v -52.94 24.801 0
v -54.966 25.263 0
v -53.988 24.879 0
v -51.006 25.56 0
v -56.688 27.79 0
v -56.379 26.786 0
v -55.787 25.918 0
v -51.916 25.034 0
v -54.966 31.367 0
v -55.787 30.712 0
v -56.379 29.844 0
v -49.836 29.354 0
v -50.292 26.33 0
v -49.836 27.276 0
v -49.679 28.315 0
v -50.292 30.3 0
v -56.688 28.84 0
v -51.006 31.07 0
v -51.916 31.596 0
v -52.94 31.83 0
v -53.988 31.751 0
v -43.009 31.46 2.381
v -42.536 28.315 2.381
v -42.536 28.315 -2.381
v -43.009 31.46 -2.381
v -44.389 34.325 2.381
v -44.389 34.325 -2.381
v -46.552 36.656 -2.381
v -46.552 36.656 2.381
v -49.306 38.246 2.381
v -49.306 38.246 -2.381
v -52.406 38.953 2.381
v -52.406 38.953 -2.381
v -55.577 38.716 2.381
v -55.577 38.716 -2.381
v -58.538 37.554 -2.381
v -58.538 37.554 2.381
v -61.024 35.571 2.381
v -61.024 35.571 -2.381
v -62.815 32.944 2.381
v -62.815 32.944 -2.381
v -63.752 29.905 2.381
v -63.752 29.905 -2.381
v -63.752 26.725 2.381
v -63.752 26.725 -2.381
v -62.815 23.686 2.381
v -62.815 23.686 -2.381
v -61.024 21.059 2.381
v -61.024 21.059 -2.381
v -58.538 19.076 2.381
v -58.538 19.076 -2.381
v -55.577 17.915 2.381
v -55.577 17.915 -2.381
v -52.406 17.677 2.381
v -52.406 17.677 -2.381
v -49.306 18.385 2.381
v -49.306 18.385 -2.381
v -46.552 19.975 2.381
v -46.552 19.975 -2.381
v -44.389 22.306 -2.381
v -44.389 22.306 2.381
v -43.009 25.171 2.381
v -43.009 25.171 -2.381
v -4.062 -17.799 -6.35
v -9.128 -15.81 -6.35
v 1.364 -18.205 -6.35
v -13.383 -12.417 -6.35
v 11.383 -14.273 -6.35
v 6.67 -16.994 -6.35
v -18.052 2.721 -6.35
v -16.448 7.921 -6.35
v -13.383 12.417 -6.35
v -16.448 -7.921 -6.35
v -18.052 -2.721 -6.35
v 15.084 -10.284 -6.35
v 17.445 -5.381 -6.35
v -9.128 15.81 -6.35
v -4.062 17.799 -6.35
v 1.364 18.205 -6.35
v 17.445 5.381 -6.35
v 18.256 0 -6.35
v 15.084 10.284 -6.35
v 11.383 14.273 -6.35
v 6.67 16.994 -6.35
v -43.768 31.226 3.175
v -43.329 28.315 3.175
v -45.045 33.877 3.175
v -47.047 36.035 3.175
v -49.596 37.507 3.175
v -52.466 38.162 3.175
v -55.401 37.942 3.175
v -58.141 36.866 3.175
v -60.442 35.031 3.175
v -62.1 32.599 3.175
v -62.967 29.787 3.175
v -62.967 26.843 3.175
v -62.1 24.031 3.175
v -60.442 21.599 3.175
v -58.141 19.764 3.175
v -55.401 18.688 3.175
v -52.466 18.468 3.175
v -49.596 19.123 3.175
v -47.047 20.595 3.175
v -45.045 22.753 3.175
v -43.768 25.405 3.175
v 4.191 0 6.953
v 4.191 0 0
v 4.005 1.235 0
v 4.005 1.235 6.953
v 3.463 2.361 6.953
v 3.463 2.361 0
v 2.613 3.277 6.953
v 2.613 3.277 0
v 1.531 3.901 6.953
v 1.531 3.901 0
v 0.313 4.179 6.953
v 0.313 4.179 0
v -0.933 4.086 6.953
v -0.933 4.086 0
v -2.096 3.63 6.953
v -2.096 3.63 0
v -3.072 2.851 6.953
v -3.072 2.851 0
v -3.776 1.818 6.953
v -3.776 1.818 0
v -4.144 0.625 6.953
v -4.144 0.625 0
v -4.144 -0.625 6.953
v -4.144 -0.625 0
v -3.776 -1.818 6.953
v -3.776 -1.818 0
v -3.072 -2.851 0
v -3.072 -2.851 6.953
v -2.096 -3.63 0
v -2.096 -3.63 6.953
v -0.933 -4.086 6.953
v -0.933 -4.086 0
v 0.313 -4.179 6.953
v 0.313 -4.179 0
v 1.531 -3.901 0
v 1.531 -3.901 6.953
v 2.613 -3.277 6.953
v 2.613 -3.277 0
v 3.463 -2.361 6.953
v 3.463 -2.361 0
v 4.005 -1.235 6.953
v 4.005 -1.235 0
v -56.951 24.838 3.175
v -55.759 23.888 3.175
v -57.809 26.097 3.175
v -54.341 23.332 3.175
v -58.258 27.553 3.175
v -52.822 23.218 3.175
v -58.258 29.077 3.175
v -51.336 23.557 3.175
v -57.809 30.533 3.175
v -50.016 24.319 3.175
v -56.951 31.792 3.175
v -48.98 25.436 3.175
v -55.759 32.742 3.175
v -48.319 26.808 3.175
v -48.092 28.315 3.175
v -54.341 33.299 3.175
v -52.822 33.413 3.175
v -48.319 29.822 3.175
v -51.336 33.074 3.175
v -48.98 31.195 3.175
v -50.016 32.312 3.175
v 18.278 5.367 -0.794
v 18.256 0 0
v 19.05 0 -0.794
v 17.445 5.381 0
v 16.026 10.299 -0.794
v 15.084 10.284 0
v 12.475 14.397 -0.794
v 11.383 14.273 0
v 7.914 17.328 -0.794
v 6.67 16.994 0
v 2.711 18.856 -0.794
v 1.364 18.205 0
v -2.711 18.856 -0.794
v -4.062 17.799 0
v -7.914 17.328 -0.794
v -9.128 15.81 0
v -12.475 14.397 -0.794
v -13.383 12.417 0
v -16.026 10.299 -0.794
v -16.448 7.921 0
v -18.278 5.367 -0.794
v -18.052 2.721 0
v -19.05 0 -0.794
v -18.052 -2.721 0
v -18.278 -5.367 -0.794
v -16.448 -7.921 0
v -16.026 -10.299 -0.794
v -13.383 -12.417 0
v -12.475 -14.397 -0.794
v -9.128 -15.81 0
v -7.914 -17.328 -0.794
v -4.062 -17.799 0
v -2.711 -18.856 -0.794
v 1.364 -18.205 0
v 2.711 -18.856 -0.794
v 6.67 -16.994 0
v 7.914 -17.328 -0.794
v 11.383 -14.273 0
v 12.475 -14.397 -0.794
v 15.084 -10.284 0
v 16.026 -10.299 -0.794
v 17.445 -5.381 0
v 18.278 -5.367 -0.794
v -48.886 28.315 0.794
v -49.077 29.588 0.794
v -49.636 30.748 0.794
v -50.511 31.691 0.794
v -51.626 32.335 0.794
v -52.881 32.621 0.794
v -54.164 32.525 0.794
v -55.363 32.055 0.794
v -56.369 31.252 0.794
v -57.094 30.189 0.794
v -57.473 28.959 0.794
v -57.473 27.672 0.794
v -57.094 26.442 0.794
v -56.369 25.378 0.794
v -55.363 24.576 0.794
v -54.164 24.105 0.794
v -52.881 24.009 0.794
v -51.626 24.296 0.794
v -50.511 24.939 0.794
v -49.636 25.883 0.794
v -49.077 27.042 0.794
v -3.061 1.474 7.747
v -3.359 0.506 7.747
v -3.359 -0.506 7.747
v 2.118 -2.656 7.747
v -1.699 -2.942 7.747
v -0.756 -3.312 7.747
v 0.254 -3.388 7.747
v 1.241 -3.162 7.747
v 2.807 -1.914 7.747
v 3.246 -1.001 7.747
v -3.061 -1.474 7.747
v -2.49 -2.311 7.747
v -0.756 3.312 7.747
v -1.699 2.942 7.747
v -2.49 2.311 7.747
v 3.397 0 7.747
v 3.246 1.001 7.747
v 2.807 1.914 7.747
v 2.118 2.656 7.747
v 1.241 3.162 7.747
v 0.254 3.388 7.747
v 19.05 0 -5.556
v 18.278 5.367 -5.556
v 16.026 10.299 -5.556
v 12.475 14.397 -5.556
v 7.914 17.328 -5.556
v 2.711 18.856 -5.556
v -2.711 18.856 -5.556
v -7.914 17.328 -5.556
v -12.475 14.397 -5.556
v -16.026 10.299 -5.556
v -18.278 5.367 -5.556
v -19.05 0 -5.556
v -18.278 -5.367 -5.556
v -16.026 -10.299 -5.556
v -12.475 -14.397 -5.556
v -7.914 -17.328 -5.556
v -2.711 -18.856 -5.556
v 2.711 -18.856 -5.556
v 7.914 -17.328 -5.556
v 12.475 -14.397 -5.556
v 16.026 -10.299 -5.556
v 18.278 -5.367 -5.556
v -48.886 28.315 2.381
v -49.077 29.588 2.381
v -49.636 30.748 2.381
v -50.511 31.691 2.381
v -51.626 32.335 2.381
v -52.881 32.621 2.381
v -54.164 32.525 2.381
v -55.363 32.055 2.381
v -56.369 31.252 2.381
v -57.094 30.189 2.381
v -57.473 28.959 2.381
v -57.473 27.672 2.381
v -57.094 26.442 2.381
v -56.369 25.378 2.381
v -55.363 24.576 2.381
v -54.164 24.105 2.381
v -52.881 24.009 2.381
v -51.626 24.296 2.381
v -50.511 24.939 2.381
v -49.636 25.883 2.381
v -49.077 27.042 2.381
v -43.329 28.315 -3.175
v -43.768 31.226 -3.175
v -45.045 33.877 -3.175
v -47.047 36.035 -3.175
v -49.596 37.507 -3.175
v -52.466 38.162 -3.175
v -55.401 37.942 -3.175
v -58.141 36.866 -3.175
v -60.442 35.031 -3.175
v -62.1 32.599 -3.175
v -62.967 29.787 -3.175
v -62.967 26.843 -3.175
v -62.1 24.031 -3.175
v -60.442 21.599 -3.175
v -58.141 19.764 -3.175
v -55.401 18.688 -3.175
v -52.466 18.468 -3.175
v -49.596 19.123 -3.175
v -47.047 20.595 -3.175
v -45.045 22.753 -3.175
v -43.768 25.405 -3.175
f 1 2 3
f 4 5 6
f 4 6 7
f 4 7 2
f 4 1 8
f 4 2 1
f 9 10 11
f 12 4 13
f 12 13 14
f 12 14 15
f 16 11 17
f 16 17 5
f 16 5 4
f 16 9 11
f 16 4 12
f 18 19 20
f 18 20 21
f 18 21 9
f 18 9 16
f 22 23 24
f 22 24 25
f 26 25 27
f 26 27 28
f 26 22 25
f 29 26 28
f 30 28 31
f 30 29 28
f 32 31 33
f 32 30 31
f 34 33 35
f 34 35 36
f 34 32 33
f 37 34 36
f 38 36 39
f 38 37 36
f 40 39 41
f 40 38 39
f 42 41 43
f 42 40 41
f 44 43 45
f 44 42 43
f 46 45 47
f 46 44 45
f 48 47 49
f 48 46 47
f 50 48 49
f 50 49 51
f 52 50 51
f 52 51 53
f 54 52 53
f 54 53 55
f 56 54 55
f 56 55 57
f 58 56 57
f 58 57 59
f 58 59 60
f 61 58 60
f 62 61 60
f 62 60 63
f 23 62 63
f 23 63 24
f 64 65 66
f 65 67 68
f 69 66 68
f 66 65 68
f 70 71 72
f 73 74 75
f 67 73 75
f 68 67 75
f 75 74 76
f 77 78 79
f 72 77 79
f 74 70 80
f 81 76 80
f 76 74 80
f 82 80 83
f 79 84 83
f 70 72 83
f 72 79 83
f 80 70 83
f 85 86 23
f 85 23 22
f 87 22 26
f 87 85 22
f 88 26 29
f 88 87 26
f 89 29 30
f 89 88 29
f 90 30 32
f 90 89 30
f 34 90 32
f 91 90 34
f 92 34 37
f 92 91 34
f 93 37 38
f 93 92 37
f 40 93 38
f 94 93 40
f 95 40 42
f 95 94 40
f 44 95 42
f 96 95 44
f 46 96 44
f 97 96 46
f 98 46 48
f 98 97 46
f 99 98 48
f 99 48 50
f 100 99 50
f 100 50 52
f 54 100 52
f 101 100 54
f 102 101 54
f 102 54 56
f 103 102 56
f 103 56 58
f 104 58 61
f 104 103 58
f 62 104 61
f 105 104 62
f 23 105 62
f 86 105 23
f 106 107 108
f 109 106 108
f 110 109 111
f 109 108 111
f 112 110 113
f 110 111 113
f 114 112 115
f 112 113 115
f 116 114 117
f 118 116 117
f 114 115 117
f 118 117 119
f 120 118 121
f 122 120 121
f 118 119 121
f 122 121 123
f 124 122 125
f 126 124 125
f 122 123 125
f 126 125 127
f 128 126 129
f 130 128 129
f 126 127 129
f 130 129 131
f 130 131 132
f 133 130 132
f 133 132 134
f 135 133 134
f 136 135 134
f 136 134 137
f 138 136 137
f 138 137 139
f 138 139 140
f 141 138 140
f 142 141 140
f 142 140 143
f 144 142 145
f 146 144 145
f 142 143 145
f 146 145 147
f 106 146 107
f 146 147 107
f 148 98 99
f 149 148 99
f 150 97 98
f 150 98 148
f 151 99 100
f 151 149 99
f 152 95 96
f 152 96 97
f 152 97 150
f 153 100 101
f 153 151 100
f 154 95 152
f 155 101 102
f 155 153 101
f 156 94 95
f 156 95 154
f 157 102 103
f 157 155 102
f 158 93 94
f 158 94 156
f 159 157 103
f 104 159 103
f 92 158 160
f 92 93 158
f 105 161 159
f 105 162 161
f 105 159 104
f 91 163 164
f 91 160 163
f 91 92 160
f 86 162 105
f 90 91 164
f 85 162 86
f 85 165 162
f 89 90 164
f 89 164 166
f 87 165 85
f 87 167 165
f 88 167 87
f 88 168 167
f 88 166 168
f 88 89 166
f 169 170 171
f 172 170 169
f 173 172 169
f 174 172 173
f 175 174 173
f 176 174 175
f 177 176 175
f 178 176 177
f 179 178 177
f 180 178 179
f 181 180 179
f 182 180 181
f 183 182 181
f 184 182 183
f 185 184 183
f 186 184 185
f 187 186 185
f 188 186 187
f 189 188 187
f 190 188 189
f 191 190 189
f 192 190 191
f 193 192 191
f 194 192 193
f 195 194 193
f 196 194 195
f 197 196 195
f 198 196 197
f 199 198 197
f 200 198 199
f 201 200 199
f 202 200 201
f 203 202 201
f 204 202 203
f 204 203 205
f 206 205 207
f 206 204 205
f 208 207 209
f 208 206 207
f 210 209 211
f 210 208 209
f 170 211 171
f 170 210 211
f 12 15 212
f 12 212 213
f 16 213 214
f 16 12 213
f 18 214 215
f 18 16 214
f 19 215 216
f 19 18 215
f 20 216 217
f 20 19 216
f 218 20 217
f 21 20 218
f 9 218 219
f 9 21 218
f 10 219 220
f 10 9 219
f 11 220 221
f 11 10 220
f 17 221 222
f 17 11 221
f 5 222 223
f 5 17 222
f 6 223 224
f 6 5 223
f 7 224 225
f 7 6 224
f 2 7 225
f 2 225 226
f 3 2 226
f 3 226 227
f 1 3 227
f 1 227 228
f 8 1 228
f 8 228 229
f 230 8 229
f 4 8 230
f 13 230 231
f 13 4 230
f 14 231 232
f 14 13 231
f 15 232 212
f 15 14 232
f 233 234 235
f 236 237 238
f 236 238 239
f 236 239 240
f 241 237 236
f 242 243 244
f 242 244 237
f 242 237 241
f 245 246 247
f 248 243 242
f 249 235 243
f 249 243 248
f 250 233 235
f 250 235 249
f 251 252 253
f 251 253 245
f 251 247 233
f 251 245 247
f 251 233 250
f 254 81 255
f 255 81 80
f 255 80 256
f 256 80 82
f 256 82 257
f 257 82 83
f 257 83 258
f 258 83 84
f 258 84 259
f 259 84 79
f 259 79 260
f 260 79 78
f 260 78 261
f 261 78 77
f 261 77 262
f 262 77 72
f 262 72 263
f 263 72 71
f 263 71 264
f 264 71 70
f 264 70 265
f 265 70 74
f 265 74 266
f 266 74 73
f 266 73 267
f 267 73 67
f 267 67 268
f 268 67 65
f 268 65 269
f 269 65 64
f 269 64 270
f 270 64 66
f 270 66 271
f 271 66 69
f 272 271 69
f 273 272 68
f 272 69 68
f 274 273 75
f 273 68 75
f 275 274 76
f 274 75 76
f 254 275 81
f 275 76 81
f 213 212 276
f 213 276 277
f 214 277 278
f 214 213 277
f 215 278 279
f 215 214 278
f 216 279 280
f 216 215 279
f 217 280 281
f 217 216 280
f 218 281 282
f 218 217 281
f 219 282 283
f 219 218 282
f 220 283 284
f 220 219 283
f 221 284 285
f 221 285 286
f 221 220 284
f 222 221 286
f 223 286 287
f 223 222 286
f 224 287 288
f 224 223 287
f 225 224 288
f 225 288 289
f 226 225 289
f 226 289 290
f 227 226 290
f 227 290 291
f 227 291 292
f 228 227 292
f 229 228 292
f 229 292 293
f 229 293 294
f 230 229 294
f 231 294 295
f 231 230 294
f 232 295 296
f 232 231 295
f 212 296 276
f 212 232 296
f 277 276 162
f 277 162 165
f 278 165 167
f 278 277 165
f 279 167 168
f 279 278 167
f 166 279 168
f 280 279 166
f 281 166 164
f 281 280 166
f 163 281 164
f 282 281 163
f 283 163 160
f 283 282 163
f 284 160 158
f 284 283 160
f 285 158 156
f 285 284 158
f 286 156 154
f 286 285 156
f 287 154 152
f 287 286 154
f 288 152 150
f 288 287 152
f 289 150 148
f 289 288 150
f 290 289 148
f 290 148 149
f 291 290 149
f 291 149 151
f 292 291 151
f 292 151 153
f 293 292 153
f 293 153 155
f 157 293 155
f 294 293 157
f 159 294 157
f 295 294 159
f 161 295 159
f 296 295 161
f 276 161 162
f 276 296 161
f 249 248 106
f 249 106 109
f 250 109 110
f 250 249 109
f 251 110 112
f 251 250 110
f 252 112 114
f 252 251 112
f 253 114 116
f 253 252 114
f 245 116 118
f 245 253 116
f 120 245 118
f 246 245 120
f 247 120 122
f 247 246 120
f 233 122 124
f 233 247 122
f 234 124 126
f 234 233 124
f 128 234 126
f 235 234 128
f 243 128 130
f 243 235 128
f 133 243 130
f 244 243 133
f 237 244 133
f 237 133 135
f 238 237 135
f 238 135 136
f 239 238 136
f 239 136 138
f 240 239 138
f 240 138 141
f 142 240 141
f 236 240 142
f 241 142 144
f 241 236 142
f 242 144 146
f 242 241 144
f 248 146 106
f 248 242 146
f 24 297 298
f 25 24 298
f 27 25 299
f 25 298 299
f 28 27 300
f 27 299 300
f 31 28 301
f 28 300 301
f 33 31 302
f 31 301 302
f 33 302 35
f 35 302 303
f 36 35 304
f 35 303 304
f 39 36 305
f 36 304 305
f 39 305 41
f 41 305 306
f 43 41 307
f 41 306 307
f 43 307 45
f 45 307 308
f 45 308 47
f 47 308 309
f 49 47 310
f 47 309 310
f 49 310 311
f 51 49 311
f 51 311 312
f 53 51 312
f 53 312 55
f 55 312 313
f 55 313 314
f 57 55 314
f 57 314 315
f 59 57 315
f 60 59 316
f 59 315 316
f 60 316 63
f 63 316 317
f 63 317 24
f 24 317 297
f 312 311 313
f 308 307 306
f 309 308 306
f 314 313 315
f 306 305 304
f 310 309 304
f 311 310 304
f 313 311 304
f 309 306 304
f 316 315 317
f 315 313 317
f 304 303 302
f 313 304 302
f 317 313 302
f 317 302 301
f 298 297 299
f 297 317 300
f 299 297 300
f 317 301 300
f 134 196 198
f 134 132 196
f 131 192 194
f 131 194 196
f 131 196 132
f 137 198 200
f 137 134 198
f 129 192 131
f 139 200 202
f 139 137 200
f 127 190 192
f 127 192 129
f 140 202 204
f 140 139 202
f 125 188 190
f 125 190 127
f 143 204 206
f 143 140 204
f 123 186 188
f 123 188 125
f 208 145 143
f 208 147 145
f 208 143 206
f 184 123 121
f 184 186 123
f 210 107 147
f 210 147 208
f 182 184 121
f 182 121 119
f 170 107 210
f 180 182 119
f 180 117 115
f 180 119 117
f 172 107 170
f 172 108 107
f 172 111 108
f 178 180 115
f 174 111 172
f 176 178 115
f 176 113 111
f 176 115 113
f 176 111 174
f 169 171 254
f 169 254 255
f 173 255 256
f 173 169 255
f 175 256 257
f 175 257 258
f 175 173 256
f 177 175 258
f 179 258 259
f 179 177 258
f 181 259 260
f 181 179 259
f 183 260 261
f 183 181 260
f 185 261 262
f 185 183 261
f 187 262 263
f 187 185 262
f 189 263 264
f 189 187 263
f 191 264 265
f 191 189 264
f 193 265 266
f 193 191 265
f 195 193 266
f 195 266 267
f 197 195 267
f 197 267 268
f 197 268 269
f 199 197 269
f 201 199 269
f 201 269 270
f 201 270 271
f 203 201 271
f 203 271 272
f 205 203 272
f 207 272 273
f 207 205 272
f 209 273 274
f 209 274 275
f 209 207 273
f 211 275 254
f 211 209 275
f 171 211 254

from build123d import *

# Parameters (mm, degrees)
F0_R      = 4.191
F1_DEPTH  = 7.747
F0_R_2    = 19.05
F2_DEPTH  = 6.35
F0_R_3    = 10.668
F0_R_4    = 4.318
F3_DEPTH  = 3.175
F4_DEPTH  = 3.175
F5_SIZE   = 0.79375
F5_2_SIZE = 0.79375


with BuildPart() as f1:
    # F0 (on Top) → F1 (new body)
    with BuildSketch(Plane.XY):
        Circle(F0_R)
    extrude(amount=F1_DEPTH)

    # F0 (on Top) → F2 (join)
    with BuildSketch(Plane.XY):
        Circle(F0_R_2)
        Circle(F0_R, mode=Mode.SUBTRACT)
        Circle(F0_R)
    extrude(amount=-F2_DEPTH)

    # F5#2
    f5_2_edges = [f1.edges().sort_by_distance(p)[0] for p in [
        (19.05, 0, -3.175),
        (-19.05, 0, 0),
        (-19.05, 0, -6.35),
        (-4.191, 0, 7.747),
    ]]
    chamfer(f5_2_edges, length=F5_2_SIZE)


with BuildPart() as f3:
    # F0 (on Top) → F3 (new body)
    with BuildSketch(Plane.XY):
        with Locations((-53.2035343349, 28.3151138574)):
            Circle(F0_R_3)
        with Locations((-53.2035343349, 28.3151138574)):
            Circle(F0_R_4, mode=Mode.SUBTRACT)
    extrude(amount=F3_DEPTH)

    # F0 (on Top) → F4 (join)
    with BuildSketch(Plane.XY):
        with Locations((-53.2035343349, 28.3151138574)):
            Circle(F0_R_3)
        with Locations((-53.2035343349, 28.3151138574)):
            Circle(F0_R_4, mode=Mode.SUBTRACT)
        with Locations((-53.2035343349, 28.3151138574)):
            Circle(F0_R_4)
    extrude(amount=-F4_DEPTH)

    # F5
    f5_edges = [f3.edges().sort_by_distance(p)[0] for p in [
        (-63.871534, 28.315114, 3.175),
        (-57.521534, 28.315114, 0),
        (-57.521534, 28.315114, 3.175),
        (-63.871534, 28.315114, -3.175),
    ]]
    chamfer(f5_edges, length=F5_SIZE)


solid = Compound([f1.part, f3.part])
